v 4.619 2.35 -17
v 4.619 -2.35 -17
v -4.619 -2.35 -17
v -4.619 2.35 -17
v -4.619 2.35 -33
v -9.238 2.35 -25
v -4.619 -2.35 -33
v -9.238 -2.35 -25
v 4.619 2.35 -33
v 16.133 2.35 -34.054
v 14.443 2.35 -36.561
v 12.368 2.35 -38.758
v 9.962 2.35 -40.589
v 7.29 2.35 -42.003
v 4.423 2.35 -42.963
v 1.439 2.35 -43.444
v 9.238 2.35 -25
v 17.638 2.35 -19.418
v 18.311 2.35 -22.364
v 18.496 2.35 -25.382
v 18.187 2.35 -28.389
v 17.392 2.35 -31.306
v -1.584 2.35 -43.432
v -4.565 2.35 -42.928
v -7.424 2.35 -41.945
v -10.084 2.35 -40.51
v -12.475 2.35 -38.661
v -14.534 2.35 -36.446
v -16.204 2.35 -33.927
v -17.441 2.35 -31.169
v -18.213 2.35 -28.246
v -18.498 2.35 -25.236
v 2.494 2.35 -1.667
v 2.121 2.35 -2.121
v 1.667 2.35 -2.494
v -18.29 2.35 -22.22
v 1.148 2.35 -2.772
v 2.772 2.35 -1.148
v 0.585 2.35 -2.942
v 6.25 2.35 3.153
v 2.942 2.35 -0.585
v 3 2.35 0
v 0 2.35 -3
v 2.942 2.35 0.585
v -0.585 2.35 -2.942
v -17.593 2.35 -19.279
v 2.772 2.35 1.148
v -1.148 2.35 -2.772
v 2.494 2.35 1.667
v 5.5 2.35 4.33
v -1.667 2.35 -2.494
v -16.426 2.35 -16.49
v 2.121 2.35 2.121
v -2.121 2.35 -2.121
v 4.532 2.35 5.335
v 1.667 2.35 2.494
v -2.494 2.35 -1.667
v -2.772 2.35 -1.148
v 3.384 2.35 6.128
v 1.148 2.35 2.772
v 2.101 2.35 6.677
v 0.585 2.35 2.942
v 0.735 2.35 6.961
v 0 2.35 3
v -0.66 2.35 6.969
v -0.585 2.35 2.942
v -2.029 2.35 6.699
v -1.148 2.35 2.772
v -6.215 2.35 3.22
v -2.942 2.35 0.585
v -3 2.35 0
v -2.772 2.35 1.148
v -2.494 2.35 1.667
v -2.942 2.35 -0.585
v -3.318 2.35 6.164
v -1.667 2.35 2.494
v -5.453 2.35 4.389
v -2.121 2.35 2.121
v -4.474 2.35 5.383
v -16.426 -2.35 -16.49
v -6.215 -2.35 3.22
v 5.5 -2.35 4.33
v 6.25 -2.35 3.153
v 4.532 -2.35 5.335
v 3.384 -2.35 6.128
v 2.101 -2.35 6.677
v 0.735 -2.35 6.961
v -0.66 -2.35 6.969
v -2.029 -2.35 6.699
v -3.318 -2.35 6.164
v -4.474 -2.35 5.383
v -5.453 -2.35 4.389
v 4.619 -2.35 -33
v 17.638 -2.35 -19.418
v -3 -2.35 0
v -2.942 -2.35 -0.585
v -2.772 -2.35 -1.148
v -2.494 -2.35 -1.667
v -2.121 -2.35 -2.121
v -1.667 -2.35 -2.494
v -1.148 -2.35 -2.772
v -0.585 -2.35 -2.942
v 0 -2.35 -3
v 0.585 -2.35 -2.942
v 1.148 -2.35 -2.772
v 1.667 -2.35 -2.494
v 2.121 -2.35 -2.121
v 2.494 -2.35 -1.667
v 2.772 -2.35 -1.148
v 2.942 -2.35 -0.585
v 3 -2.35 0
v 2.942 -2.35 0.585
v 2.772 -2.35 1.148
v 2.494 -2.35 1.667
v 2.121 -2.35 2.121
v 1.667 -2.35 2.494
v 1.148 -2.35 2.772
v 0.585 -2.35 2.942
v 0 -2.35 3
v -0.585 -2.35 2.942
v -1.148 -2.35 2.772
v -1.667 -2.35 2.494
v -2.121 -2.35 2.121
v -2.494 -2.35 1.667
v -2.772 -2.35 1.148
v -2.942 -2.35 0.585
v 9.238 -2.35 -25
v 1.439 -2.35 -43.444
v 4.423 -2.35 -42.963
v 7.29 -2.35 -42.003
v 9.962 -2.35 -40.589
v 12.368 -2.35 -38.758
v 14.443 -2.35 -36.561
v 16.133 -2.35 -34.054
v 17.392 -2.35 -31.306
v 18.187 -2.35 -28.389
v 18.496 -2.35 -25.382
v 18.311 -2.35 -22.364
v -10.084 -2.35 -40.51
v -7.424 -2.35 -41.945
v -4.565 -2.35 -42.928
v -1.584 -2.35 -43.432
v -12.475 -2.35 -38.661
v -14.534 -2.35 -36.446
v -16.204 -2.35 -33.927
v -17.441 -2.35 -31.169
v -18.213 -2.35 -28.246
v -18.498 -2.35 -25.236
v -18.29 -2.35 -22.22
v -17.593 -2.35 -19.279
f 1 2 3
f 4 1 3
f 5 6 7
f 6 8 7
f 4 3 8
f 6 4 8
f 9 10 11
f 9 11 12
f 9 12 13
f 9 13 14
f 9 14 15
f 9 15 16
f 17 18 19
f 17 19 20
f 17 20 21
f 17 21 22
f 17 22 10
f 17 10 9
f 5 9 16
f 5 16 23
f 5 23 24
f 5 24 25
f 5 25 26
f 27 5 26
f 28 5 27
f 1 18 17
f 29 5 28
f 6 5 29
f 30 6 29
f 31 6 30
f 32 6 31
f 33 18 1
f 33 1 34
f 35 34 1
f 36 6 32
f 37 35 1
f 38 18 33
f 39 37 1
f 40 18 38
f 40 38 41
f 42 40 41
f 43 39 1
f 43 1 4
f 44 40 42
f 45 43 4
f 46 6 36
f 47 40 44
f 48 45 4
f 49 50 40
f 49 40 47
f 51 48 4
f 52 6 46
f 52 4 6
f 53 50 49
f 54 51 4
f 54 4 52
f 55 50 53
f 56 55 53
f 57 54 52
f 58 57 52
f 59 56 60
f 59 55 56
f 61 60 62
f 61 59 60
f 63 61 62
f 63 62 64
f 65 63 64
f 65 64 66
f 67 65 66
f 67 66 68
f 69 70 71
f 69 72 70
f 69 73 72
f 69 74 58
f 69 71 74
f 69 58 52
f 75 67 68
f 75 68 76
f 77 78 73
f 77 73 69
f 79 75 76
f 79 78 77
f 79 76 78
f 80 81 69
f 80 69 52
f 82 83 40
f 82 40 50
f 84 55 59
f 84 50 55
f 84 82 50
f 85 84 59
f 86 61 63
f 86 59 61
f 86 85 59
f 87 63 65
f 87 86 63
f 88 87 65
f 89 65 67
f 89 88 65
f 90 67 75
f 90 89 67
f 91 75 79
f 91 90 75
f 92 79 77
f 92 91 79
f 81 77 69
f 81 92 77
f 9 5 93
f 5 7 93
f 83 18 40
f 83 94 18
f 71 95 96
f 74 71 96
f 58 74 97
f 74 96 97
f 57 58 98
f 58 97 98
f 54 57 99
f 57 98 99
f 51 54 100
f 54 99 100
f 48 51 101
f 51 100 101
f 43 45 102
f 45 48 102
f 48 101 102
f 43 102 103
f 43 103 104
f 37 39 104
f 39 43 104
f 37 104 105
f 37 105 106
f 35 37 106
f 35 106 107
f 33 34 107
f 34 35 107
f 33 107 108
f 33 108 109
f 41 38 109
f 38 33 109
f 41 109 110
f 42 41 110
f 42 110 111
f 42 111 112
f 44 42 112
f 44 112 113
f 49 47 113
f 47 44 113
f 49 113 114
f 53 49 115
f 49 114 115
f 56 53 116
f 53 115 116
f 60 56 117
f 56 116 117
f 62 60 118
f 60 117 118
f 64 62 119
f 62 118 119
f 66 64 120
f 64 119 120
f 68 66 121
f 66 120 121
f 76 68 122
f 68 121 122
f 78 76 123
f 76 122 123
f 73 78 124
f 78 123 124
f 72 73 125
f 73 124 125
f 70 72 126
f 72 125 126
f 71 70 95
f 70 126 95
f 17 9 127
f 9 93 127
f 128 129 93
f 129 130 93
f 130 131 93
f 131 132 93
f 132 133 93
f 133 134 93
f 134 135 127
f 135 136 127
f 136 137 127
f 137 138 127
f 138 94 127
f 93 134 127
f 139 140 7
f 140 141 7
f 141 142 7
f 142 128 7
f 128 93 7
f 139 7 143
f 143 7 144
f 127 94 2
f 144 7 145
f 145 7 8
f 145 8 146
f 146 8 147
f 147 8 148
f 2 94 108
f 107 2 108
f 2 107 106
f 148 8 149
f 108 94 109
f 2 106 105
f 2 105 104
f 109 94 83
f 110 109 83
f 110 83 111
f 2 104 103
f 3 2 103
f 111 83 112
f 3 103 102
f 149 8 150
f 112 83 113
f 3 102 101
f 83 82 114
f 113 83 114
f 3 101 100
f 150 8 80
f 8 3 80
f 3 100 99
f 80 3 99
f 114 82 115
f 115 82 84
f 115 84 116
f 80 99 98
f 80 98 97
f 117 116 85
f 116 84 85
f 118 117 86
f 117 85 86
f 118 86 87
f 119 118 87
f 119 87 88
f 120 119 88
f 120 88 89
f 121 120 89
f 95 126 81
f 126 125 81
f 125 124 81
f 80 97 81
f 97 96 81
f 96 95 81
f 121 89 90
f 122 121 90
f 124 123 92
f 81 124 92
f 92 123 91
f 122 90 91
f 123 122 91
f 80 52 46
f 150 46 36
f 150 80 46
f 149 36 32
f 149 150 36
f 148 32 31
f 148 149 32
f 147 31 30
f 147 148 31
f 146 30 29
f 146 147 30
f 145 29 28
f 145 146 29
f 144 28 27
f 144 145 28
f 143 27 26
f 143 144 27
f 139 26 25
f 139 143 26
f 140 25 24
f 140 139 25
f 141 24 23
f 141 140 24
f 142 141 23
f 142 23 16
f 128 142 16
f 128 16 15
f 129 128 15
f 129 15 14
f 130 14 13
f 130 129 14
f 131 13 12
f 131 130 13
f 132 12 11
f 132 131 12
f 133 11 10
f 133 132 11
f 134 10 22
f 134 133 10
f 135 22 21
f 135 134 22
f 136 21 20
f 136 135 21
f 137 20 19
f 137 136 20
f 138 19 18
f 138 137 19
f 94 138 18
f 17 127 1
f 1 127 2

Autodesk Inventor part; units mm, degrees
ref_plane "YZ Plane" through (0, 0, 0) normal (1, 0, 0) x (0, 1, 0)
ref_plane "XZ Plane" through (0, 0, 0) normal (0, 1, 0) x (-1, 0, 0)
ref_plane "XY Plane" through (0, 0, 0) normal (0, 0, 1) x (1, 0, 0)
sketch "Sketch1" plane through (0, 0, 0) normal (0, 1, 0) x (-1, 0, 0)
  circle A0 centre (0, 0) radius 3
  circle A1 centre (0, 0) radius 7
  circle A2 centre (0, -25) radius 18.5
  line L0 (6.2154, 3.22) -> (16.4265, -16.49)
  line L1 (-17.6376, -19.4175) -> (-6.2496, 3.1532)
  line L2 (9.2376, -25) -> (4.6188, -33)
  line L3 (4.6188, -33) -> (-4.6188, -33)
  line L4 (-4.6188, -33) -> (-9.2376, -25)
  line L5 (-9.2376, -25) -> (-4.6188, -17)
  line L6 (-4.6188, -17) -> (4.6188, -17)
  line L7 (4.6188, -17) -> (9.2376, -25)
  point P0 (4.4139, 5.433)
  point P1 (-13.2255, -12.0641)
  dimension "d3" = 6
  dimension "d6" = 14
  dimension "d11" = 25
  dimension "d12" = 37
  dimension "d13" = 16
extrude "Plate1" add sketch "Sketch1" along normal mid plane 4.7 contours A1 A2 | A1 L0 A2 | A2 L1 A1 | A1 A2 | A1 A2 L1
equation "\"d9\" = Thickness"
equation "\"BendRadius\" = Thickness"
equation "\"BendReliefWidth\" = Thickness"
equation "\"BendReliefDepth\" = 0.5 * Thickness"
equation "\"CornerReliefSize\" = 4 * Thickness"
equation "\"MinimumRemnant\" = 2 * Thickness"
equation "\"TransitionRadius\" = BendRadius"
equation "\"JacobiRadiusSize\" = BendRadius"
equation "\"GapSize\" = Thickness"
equation "\"Thickness\" = 4.7"
properties part number "palanca2"
